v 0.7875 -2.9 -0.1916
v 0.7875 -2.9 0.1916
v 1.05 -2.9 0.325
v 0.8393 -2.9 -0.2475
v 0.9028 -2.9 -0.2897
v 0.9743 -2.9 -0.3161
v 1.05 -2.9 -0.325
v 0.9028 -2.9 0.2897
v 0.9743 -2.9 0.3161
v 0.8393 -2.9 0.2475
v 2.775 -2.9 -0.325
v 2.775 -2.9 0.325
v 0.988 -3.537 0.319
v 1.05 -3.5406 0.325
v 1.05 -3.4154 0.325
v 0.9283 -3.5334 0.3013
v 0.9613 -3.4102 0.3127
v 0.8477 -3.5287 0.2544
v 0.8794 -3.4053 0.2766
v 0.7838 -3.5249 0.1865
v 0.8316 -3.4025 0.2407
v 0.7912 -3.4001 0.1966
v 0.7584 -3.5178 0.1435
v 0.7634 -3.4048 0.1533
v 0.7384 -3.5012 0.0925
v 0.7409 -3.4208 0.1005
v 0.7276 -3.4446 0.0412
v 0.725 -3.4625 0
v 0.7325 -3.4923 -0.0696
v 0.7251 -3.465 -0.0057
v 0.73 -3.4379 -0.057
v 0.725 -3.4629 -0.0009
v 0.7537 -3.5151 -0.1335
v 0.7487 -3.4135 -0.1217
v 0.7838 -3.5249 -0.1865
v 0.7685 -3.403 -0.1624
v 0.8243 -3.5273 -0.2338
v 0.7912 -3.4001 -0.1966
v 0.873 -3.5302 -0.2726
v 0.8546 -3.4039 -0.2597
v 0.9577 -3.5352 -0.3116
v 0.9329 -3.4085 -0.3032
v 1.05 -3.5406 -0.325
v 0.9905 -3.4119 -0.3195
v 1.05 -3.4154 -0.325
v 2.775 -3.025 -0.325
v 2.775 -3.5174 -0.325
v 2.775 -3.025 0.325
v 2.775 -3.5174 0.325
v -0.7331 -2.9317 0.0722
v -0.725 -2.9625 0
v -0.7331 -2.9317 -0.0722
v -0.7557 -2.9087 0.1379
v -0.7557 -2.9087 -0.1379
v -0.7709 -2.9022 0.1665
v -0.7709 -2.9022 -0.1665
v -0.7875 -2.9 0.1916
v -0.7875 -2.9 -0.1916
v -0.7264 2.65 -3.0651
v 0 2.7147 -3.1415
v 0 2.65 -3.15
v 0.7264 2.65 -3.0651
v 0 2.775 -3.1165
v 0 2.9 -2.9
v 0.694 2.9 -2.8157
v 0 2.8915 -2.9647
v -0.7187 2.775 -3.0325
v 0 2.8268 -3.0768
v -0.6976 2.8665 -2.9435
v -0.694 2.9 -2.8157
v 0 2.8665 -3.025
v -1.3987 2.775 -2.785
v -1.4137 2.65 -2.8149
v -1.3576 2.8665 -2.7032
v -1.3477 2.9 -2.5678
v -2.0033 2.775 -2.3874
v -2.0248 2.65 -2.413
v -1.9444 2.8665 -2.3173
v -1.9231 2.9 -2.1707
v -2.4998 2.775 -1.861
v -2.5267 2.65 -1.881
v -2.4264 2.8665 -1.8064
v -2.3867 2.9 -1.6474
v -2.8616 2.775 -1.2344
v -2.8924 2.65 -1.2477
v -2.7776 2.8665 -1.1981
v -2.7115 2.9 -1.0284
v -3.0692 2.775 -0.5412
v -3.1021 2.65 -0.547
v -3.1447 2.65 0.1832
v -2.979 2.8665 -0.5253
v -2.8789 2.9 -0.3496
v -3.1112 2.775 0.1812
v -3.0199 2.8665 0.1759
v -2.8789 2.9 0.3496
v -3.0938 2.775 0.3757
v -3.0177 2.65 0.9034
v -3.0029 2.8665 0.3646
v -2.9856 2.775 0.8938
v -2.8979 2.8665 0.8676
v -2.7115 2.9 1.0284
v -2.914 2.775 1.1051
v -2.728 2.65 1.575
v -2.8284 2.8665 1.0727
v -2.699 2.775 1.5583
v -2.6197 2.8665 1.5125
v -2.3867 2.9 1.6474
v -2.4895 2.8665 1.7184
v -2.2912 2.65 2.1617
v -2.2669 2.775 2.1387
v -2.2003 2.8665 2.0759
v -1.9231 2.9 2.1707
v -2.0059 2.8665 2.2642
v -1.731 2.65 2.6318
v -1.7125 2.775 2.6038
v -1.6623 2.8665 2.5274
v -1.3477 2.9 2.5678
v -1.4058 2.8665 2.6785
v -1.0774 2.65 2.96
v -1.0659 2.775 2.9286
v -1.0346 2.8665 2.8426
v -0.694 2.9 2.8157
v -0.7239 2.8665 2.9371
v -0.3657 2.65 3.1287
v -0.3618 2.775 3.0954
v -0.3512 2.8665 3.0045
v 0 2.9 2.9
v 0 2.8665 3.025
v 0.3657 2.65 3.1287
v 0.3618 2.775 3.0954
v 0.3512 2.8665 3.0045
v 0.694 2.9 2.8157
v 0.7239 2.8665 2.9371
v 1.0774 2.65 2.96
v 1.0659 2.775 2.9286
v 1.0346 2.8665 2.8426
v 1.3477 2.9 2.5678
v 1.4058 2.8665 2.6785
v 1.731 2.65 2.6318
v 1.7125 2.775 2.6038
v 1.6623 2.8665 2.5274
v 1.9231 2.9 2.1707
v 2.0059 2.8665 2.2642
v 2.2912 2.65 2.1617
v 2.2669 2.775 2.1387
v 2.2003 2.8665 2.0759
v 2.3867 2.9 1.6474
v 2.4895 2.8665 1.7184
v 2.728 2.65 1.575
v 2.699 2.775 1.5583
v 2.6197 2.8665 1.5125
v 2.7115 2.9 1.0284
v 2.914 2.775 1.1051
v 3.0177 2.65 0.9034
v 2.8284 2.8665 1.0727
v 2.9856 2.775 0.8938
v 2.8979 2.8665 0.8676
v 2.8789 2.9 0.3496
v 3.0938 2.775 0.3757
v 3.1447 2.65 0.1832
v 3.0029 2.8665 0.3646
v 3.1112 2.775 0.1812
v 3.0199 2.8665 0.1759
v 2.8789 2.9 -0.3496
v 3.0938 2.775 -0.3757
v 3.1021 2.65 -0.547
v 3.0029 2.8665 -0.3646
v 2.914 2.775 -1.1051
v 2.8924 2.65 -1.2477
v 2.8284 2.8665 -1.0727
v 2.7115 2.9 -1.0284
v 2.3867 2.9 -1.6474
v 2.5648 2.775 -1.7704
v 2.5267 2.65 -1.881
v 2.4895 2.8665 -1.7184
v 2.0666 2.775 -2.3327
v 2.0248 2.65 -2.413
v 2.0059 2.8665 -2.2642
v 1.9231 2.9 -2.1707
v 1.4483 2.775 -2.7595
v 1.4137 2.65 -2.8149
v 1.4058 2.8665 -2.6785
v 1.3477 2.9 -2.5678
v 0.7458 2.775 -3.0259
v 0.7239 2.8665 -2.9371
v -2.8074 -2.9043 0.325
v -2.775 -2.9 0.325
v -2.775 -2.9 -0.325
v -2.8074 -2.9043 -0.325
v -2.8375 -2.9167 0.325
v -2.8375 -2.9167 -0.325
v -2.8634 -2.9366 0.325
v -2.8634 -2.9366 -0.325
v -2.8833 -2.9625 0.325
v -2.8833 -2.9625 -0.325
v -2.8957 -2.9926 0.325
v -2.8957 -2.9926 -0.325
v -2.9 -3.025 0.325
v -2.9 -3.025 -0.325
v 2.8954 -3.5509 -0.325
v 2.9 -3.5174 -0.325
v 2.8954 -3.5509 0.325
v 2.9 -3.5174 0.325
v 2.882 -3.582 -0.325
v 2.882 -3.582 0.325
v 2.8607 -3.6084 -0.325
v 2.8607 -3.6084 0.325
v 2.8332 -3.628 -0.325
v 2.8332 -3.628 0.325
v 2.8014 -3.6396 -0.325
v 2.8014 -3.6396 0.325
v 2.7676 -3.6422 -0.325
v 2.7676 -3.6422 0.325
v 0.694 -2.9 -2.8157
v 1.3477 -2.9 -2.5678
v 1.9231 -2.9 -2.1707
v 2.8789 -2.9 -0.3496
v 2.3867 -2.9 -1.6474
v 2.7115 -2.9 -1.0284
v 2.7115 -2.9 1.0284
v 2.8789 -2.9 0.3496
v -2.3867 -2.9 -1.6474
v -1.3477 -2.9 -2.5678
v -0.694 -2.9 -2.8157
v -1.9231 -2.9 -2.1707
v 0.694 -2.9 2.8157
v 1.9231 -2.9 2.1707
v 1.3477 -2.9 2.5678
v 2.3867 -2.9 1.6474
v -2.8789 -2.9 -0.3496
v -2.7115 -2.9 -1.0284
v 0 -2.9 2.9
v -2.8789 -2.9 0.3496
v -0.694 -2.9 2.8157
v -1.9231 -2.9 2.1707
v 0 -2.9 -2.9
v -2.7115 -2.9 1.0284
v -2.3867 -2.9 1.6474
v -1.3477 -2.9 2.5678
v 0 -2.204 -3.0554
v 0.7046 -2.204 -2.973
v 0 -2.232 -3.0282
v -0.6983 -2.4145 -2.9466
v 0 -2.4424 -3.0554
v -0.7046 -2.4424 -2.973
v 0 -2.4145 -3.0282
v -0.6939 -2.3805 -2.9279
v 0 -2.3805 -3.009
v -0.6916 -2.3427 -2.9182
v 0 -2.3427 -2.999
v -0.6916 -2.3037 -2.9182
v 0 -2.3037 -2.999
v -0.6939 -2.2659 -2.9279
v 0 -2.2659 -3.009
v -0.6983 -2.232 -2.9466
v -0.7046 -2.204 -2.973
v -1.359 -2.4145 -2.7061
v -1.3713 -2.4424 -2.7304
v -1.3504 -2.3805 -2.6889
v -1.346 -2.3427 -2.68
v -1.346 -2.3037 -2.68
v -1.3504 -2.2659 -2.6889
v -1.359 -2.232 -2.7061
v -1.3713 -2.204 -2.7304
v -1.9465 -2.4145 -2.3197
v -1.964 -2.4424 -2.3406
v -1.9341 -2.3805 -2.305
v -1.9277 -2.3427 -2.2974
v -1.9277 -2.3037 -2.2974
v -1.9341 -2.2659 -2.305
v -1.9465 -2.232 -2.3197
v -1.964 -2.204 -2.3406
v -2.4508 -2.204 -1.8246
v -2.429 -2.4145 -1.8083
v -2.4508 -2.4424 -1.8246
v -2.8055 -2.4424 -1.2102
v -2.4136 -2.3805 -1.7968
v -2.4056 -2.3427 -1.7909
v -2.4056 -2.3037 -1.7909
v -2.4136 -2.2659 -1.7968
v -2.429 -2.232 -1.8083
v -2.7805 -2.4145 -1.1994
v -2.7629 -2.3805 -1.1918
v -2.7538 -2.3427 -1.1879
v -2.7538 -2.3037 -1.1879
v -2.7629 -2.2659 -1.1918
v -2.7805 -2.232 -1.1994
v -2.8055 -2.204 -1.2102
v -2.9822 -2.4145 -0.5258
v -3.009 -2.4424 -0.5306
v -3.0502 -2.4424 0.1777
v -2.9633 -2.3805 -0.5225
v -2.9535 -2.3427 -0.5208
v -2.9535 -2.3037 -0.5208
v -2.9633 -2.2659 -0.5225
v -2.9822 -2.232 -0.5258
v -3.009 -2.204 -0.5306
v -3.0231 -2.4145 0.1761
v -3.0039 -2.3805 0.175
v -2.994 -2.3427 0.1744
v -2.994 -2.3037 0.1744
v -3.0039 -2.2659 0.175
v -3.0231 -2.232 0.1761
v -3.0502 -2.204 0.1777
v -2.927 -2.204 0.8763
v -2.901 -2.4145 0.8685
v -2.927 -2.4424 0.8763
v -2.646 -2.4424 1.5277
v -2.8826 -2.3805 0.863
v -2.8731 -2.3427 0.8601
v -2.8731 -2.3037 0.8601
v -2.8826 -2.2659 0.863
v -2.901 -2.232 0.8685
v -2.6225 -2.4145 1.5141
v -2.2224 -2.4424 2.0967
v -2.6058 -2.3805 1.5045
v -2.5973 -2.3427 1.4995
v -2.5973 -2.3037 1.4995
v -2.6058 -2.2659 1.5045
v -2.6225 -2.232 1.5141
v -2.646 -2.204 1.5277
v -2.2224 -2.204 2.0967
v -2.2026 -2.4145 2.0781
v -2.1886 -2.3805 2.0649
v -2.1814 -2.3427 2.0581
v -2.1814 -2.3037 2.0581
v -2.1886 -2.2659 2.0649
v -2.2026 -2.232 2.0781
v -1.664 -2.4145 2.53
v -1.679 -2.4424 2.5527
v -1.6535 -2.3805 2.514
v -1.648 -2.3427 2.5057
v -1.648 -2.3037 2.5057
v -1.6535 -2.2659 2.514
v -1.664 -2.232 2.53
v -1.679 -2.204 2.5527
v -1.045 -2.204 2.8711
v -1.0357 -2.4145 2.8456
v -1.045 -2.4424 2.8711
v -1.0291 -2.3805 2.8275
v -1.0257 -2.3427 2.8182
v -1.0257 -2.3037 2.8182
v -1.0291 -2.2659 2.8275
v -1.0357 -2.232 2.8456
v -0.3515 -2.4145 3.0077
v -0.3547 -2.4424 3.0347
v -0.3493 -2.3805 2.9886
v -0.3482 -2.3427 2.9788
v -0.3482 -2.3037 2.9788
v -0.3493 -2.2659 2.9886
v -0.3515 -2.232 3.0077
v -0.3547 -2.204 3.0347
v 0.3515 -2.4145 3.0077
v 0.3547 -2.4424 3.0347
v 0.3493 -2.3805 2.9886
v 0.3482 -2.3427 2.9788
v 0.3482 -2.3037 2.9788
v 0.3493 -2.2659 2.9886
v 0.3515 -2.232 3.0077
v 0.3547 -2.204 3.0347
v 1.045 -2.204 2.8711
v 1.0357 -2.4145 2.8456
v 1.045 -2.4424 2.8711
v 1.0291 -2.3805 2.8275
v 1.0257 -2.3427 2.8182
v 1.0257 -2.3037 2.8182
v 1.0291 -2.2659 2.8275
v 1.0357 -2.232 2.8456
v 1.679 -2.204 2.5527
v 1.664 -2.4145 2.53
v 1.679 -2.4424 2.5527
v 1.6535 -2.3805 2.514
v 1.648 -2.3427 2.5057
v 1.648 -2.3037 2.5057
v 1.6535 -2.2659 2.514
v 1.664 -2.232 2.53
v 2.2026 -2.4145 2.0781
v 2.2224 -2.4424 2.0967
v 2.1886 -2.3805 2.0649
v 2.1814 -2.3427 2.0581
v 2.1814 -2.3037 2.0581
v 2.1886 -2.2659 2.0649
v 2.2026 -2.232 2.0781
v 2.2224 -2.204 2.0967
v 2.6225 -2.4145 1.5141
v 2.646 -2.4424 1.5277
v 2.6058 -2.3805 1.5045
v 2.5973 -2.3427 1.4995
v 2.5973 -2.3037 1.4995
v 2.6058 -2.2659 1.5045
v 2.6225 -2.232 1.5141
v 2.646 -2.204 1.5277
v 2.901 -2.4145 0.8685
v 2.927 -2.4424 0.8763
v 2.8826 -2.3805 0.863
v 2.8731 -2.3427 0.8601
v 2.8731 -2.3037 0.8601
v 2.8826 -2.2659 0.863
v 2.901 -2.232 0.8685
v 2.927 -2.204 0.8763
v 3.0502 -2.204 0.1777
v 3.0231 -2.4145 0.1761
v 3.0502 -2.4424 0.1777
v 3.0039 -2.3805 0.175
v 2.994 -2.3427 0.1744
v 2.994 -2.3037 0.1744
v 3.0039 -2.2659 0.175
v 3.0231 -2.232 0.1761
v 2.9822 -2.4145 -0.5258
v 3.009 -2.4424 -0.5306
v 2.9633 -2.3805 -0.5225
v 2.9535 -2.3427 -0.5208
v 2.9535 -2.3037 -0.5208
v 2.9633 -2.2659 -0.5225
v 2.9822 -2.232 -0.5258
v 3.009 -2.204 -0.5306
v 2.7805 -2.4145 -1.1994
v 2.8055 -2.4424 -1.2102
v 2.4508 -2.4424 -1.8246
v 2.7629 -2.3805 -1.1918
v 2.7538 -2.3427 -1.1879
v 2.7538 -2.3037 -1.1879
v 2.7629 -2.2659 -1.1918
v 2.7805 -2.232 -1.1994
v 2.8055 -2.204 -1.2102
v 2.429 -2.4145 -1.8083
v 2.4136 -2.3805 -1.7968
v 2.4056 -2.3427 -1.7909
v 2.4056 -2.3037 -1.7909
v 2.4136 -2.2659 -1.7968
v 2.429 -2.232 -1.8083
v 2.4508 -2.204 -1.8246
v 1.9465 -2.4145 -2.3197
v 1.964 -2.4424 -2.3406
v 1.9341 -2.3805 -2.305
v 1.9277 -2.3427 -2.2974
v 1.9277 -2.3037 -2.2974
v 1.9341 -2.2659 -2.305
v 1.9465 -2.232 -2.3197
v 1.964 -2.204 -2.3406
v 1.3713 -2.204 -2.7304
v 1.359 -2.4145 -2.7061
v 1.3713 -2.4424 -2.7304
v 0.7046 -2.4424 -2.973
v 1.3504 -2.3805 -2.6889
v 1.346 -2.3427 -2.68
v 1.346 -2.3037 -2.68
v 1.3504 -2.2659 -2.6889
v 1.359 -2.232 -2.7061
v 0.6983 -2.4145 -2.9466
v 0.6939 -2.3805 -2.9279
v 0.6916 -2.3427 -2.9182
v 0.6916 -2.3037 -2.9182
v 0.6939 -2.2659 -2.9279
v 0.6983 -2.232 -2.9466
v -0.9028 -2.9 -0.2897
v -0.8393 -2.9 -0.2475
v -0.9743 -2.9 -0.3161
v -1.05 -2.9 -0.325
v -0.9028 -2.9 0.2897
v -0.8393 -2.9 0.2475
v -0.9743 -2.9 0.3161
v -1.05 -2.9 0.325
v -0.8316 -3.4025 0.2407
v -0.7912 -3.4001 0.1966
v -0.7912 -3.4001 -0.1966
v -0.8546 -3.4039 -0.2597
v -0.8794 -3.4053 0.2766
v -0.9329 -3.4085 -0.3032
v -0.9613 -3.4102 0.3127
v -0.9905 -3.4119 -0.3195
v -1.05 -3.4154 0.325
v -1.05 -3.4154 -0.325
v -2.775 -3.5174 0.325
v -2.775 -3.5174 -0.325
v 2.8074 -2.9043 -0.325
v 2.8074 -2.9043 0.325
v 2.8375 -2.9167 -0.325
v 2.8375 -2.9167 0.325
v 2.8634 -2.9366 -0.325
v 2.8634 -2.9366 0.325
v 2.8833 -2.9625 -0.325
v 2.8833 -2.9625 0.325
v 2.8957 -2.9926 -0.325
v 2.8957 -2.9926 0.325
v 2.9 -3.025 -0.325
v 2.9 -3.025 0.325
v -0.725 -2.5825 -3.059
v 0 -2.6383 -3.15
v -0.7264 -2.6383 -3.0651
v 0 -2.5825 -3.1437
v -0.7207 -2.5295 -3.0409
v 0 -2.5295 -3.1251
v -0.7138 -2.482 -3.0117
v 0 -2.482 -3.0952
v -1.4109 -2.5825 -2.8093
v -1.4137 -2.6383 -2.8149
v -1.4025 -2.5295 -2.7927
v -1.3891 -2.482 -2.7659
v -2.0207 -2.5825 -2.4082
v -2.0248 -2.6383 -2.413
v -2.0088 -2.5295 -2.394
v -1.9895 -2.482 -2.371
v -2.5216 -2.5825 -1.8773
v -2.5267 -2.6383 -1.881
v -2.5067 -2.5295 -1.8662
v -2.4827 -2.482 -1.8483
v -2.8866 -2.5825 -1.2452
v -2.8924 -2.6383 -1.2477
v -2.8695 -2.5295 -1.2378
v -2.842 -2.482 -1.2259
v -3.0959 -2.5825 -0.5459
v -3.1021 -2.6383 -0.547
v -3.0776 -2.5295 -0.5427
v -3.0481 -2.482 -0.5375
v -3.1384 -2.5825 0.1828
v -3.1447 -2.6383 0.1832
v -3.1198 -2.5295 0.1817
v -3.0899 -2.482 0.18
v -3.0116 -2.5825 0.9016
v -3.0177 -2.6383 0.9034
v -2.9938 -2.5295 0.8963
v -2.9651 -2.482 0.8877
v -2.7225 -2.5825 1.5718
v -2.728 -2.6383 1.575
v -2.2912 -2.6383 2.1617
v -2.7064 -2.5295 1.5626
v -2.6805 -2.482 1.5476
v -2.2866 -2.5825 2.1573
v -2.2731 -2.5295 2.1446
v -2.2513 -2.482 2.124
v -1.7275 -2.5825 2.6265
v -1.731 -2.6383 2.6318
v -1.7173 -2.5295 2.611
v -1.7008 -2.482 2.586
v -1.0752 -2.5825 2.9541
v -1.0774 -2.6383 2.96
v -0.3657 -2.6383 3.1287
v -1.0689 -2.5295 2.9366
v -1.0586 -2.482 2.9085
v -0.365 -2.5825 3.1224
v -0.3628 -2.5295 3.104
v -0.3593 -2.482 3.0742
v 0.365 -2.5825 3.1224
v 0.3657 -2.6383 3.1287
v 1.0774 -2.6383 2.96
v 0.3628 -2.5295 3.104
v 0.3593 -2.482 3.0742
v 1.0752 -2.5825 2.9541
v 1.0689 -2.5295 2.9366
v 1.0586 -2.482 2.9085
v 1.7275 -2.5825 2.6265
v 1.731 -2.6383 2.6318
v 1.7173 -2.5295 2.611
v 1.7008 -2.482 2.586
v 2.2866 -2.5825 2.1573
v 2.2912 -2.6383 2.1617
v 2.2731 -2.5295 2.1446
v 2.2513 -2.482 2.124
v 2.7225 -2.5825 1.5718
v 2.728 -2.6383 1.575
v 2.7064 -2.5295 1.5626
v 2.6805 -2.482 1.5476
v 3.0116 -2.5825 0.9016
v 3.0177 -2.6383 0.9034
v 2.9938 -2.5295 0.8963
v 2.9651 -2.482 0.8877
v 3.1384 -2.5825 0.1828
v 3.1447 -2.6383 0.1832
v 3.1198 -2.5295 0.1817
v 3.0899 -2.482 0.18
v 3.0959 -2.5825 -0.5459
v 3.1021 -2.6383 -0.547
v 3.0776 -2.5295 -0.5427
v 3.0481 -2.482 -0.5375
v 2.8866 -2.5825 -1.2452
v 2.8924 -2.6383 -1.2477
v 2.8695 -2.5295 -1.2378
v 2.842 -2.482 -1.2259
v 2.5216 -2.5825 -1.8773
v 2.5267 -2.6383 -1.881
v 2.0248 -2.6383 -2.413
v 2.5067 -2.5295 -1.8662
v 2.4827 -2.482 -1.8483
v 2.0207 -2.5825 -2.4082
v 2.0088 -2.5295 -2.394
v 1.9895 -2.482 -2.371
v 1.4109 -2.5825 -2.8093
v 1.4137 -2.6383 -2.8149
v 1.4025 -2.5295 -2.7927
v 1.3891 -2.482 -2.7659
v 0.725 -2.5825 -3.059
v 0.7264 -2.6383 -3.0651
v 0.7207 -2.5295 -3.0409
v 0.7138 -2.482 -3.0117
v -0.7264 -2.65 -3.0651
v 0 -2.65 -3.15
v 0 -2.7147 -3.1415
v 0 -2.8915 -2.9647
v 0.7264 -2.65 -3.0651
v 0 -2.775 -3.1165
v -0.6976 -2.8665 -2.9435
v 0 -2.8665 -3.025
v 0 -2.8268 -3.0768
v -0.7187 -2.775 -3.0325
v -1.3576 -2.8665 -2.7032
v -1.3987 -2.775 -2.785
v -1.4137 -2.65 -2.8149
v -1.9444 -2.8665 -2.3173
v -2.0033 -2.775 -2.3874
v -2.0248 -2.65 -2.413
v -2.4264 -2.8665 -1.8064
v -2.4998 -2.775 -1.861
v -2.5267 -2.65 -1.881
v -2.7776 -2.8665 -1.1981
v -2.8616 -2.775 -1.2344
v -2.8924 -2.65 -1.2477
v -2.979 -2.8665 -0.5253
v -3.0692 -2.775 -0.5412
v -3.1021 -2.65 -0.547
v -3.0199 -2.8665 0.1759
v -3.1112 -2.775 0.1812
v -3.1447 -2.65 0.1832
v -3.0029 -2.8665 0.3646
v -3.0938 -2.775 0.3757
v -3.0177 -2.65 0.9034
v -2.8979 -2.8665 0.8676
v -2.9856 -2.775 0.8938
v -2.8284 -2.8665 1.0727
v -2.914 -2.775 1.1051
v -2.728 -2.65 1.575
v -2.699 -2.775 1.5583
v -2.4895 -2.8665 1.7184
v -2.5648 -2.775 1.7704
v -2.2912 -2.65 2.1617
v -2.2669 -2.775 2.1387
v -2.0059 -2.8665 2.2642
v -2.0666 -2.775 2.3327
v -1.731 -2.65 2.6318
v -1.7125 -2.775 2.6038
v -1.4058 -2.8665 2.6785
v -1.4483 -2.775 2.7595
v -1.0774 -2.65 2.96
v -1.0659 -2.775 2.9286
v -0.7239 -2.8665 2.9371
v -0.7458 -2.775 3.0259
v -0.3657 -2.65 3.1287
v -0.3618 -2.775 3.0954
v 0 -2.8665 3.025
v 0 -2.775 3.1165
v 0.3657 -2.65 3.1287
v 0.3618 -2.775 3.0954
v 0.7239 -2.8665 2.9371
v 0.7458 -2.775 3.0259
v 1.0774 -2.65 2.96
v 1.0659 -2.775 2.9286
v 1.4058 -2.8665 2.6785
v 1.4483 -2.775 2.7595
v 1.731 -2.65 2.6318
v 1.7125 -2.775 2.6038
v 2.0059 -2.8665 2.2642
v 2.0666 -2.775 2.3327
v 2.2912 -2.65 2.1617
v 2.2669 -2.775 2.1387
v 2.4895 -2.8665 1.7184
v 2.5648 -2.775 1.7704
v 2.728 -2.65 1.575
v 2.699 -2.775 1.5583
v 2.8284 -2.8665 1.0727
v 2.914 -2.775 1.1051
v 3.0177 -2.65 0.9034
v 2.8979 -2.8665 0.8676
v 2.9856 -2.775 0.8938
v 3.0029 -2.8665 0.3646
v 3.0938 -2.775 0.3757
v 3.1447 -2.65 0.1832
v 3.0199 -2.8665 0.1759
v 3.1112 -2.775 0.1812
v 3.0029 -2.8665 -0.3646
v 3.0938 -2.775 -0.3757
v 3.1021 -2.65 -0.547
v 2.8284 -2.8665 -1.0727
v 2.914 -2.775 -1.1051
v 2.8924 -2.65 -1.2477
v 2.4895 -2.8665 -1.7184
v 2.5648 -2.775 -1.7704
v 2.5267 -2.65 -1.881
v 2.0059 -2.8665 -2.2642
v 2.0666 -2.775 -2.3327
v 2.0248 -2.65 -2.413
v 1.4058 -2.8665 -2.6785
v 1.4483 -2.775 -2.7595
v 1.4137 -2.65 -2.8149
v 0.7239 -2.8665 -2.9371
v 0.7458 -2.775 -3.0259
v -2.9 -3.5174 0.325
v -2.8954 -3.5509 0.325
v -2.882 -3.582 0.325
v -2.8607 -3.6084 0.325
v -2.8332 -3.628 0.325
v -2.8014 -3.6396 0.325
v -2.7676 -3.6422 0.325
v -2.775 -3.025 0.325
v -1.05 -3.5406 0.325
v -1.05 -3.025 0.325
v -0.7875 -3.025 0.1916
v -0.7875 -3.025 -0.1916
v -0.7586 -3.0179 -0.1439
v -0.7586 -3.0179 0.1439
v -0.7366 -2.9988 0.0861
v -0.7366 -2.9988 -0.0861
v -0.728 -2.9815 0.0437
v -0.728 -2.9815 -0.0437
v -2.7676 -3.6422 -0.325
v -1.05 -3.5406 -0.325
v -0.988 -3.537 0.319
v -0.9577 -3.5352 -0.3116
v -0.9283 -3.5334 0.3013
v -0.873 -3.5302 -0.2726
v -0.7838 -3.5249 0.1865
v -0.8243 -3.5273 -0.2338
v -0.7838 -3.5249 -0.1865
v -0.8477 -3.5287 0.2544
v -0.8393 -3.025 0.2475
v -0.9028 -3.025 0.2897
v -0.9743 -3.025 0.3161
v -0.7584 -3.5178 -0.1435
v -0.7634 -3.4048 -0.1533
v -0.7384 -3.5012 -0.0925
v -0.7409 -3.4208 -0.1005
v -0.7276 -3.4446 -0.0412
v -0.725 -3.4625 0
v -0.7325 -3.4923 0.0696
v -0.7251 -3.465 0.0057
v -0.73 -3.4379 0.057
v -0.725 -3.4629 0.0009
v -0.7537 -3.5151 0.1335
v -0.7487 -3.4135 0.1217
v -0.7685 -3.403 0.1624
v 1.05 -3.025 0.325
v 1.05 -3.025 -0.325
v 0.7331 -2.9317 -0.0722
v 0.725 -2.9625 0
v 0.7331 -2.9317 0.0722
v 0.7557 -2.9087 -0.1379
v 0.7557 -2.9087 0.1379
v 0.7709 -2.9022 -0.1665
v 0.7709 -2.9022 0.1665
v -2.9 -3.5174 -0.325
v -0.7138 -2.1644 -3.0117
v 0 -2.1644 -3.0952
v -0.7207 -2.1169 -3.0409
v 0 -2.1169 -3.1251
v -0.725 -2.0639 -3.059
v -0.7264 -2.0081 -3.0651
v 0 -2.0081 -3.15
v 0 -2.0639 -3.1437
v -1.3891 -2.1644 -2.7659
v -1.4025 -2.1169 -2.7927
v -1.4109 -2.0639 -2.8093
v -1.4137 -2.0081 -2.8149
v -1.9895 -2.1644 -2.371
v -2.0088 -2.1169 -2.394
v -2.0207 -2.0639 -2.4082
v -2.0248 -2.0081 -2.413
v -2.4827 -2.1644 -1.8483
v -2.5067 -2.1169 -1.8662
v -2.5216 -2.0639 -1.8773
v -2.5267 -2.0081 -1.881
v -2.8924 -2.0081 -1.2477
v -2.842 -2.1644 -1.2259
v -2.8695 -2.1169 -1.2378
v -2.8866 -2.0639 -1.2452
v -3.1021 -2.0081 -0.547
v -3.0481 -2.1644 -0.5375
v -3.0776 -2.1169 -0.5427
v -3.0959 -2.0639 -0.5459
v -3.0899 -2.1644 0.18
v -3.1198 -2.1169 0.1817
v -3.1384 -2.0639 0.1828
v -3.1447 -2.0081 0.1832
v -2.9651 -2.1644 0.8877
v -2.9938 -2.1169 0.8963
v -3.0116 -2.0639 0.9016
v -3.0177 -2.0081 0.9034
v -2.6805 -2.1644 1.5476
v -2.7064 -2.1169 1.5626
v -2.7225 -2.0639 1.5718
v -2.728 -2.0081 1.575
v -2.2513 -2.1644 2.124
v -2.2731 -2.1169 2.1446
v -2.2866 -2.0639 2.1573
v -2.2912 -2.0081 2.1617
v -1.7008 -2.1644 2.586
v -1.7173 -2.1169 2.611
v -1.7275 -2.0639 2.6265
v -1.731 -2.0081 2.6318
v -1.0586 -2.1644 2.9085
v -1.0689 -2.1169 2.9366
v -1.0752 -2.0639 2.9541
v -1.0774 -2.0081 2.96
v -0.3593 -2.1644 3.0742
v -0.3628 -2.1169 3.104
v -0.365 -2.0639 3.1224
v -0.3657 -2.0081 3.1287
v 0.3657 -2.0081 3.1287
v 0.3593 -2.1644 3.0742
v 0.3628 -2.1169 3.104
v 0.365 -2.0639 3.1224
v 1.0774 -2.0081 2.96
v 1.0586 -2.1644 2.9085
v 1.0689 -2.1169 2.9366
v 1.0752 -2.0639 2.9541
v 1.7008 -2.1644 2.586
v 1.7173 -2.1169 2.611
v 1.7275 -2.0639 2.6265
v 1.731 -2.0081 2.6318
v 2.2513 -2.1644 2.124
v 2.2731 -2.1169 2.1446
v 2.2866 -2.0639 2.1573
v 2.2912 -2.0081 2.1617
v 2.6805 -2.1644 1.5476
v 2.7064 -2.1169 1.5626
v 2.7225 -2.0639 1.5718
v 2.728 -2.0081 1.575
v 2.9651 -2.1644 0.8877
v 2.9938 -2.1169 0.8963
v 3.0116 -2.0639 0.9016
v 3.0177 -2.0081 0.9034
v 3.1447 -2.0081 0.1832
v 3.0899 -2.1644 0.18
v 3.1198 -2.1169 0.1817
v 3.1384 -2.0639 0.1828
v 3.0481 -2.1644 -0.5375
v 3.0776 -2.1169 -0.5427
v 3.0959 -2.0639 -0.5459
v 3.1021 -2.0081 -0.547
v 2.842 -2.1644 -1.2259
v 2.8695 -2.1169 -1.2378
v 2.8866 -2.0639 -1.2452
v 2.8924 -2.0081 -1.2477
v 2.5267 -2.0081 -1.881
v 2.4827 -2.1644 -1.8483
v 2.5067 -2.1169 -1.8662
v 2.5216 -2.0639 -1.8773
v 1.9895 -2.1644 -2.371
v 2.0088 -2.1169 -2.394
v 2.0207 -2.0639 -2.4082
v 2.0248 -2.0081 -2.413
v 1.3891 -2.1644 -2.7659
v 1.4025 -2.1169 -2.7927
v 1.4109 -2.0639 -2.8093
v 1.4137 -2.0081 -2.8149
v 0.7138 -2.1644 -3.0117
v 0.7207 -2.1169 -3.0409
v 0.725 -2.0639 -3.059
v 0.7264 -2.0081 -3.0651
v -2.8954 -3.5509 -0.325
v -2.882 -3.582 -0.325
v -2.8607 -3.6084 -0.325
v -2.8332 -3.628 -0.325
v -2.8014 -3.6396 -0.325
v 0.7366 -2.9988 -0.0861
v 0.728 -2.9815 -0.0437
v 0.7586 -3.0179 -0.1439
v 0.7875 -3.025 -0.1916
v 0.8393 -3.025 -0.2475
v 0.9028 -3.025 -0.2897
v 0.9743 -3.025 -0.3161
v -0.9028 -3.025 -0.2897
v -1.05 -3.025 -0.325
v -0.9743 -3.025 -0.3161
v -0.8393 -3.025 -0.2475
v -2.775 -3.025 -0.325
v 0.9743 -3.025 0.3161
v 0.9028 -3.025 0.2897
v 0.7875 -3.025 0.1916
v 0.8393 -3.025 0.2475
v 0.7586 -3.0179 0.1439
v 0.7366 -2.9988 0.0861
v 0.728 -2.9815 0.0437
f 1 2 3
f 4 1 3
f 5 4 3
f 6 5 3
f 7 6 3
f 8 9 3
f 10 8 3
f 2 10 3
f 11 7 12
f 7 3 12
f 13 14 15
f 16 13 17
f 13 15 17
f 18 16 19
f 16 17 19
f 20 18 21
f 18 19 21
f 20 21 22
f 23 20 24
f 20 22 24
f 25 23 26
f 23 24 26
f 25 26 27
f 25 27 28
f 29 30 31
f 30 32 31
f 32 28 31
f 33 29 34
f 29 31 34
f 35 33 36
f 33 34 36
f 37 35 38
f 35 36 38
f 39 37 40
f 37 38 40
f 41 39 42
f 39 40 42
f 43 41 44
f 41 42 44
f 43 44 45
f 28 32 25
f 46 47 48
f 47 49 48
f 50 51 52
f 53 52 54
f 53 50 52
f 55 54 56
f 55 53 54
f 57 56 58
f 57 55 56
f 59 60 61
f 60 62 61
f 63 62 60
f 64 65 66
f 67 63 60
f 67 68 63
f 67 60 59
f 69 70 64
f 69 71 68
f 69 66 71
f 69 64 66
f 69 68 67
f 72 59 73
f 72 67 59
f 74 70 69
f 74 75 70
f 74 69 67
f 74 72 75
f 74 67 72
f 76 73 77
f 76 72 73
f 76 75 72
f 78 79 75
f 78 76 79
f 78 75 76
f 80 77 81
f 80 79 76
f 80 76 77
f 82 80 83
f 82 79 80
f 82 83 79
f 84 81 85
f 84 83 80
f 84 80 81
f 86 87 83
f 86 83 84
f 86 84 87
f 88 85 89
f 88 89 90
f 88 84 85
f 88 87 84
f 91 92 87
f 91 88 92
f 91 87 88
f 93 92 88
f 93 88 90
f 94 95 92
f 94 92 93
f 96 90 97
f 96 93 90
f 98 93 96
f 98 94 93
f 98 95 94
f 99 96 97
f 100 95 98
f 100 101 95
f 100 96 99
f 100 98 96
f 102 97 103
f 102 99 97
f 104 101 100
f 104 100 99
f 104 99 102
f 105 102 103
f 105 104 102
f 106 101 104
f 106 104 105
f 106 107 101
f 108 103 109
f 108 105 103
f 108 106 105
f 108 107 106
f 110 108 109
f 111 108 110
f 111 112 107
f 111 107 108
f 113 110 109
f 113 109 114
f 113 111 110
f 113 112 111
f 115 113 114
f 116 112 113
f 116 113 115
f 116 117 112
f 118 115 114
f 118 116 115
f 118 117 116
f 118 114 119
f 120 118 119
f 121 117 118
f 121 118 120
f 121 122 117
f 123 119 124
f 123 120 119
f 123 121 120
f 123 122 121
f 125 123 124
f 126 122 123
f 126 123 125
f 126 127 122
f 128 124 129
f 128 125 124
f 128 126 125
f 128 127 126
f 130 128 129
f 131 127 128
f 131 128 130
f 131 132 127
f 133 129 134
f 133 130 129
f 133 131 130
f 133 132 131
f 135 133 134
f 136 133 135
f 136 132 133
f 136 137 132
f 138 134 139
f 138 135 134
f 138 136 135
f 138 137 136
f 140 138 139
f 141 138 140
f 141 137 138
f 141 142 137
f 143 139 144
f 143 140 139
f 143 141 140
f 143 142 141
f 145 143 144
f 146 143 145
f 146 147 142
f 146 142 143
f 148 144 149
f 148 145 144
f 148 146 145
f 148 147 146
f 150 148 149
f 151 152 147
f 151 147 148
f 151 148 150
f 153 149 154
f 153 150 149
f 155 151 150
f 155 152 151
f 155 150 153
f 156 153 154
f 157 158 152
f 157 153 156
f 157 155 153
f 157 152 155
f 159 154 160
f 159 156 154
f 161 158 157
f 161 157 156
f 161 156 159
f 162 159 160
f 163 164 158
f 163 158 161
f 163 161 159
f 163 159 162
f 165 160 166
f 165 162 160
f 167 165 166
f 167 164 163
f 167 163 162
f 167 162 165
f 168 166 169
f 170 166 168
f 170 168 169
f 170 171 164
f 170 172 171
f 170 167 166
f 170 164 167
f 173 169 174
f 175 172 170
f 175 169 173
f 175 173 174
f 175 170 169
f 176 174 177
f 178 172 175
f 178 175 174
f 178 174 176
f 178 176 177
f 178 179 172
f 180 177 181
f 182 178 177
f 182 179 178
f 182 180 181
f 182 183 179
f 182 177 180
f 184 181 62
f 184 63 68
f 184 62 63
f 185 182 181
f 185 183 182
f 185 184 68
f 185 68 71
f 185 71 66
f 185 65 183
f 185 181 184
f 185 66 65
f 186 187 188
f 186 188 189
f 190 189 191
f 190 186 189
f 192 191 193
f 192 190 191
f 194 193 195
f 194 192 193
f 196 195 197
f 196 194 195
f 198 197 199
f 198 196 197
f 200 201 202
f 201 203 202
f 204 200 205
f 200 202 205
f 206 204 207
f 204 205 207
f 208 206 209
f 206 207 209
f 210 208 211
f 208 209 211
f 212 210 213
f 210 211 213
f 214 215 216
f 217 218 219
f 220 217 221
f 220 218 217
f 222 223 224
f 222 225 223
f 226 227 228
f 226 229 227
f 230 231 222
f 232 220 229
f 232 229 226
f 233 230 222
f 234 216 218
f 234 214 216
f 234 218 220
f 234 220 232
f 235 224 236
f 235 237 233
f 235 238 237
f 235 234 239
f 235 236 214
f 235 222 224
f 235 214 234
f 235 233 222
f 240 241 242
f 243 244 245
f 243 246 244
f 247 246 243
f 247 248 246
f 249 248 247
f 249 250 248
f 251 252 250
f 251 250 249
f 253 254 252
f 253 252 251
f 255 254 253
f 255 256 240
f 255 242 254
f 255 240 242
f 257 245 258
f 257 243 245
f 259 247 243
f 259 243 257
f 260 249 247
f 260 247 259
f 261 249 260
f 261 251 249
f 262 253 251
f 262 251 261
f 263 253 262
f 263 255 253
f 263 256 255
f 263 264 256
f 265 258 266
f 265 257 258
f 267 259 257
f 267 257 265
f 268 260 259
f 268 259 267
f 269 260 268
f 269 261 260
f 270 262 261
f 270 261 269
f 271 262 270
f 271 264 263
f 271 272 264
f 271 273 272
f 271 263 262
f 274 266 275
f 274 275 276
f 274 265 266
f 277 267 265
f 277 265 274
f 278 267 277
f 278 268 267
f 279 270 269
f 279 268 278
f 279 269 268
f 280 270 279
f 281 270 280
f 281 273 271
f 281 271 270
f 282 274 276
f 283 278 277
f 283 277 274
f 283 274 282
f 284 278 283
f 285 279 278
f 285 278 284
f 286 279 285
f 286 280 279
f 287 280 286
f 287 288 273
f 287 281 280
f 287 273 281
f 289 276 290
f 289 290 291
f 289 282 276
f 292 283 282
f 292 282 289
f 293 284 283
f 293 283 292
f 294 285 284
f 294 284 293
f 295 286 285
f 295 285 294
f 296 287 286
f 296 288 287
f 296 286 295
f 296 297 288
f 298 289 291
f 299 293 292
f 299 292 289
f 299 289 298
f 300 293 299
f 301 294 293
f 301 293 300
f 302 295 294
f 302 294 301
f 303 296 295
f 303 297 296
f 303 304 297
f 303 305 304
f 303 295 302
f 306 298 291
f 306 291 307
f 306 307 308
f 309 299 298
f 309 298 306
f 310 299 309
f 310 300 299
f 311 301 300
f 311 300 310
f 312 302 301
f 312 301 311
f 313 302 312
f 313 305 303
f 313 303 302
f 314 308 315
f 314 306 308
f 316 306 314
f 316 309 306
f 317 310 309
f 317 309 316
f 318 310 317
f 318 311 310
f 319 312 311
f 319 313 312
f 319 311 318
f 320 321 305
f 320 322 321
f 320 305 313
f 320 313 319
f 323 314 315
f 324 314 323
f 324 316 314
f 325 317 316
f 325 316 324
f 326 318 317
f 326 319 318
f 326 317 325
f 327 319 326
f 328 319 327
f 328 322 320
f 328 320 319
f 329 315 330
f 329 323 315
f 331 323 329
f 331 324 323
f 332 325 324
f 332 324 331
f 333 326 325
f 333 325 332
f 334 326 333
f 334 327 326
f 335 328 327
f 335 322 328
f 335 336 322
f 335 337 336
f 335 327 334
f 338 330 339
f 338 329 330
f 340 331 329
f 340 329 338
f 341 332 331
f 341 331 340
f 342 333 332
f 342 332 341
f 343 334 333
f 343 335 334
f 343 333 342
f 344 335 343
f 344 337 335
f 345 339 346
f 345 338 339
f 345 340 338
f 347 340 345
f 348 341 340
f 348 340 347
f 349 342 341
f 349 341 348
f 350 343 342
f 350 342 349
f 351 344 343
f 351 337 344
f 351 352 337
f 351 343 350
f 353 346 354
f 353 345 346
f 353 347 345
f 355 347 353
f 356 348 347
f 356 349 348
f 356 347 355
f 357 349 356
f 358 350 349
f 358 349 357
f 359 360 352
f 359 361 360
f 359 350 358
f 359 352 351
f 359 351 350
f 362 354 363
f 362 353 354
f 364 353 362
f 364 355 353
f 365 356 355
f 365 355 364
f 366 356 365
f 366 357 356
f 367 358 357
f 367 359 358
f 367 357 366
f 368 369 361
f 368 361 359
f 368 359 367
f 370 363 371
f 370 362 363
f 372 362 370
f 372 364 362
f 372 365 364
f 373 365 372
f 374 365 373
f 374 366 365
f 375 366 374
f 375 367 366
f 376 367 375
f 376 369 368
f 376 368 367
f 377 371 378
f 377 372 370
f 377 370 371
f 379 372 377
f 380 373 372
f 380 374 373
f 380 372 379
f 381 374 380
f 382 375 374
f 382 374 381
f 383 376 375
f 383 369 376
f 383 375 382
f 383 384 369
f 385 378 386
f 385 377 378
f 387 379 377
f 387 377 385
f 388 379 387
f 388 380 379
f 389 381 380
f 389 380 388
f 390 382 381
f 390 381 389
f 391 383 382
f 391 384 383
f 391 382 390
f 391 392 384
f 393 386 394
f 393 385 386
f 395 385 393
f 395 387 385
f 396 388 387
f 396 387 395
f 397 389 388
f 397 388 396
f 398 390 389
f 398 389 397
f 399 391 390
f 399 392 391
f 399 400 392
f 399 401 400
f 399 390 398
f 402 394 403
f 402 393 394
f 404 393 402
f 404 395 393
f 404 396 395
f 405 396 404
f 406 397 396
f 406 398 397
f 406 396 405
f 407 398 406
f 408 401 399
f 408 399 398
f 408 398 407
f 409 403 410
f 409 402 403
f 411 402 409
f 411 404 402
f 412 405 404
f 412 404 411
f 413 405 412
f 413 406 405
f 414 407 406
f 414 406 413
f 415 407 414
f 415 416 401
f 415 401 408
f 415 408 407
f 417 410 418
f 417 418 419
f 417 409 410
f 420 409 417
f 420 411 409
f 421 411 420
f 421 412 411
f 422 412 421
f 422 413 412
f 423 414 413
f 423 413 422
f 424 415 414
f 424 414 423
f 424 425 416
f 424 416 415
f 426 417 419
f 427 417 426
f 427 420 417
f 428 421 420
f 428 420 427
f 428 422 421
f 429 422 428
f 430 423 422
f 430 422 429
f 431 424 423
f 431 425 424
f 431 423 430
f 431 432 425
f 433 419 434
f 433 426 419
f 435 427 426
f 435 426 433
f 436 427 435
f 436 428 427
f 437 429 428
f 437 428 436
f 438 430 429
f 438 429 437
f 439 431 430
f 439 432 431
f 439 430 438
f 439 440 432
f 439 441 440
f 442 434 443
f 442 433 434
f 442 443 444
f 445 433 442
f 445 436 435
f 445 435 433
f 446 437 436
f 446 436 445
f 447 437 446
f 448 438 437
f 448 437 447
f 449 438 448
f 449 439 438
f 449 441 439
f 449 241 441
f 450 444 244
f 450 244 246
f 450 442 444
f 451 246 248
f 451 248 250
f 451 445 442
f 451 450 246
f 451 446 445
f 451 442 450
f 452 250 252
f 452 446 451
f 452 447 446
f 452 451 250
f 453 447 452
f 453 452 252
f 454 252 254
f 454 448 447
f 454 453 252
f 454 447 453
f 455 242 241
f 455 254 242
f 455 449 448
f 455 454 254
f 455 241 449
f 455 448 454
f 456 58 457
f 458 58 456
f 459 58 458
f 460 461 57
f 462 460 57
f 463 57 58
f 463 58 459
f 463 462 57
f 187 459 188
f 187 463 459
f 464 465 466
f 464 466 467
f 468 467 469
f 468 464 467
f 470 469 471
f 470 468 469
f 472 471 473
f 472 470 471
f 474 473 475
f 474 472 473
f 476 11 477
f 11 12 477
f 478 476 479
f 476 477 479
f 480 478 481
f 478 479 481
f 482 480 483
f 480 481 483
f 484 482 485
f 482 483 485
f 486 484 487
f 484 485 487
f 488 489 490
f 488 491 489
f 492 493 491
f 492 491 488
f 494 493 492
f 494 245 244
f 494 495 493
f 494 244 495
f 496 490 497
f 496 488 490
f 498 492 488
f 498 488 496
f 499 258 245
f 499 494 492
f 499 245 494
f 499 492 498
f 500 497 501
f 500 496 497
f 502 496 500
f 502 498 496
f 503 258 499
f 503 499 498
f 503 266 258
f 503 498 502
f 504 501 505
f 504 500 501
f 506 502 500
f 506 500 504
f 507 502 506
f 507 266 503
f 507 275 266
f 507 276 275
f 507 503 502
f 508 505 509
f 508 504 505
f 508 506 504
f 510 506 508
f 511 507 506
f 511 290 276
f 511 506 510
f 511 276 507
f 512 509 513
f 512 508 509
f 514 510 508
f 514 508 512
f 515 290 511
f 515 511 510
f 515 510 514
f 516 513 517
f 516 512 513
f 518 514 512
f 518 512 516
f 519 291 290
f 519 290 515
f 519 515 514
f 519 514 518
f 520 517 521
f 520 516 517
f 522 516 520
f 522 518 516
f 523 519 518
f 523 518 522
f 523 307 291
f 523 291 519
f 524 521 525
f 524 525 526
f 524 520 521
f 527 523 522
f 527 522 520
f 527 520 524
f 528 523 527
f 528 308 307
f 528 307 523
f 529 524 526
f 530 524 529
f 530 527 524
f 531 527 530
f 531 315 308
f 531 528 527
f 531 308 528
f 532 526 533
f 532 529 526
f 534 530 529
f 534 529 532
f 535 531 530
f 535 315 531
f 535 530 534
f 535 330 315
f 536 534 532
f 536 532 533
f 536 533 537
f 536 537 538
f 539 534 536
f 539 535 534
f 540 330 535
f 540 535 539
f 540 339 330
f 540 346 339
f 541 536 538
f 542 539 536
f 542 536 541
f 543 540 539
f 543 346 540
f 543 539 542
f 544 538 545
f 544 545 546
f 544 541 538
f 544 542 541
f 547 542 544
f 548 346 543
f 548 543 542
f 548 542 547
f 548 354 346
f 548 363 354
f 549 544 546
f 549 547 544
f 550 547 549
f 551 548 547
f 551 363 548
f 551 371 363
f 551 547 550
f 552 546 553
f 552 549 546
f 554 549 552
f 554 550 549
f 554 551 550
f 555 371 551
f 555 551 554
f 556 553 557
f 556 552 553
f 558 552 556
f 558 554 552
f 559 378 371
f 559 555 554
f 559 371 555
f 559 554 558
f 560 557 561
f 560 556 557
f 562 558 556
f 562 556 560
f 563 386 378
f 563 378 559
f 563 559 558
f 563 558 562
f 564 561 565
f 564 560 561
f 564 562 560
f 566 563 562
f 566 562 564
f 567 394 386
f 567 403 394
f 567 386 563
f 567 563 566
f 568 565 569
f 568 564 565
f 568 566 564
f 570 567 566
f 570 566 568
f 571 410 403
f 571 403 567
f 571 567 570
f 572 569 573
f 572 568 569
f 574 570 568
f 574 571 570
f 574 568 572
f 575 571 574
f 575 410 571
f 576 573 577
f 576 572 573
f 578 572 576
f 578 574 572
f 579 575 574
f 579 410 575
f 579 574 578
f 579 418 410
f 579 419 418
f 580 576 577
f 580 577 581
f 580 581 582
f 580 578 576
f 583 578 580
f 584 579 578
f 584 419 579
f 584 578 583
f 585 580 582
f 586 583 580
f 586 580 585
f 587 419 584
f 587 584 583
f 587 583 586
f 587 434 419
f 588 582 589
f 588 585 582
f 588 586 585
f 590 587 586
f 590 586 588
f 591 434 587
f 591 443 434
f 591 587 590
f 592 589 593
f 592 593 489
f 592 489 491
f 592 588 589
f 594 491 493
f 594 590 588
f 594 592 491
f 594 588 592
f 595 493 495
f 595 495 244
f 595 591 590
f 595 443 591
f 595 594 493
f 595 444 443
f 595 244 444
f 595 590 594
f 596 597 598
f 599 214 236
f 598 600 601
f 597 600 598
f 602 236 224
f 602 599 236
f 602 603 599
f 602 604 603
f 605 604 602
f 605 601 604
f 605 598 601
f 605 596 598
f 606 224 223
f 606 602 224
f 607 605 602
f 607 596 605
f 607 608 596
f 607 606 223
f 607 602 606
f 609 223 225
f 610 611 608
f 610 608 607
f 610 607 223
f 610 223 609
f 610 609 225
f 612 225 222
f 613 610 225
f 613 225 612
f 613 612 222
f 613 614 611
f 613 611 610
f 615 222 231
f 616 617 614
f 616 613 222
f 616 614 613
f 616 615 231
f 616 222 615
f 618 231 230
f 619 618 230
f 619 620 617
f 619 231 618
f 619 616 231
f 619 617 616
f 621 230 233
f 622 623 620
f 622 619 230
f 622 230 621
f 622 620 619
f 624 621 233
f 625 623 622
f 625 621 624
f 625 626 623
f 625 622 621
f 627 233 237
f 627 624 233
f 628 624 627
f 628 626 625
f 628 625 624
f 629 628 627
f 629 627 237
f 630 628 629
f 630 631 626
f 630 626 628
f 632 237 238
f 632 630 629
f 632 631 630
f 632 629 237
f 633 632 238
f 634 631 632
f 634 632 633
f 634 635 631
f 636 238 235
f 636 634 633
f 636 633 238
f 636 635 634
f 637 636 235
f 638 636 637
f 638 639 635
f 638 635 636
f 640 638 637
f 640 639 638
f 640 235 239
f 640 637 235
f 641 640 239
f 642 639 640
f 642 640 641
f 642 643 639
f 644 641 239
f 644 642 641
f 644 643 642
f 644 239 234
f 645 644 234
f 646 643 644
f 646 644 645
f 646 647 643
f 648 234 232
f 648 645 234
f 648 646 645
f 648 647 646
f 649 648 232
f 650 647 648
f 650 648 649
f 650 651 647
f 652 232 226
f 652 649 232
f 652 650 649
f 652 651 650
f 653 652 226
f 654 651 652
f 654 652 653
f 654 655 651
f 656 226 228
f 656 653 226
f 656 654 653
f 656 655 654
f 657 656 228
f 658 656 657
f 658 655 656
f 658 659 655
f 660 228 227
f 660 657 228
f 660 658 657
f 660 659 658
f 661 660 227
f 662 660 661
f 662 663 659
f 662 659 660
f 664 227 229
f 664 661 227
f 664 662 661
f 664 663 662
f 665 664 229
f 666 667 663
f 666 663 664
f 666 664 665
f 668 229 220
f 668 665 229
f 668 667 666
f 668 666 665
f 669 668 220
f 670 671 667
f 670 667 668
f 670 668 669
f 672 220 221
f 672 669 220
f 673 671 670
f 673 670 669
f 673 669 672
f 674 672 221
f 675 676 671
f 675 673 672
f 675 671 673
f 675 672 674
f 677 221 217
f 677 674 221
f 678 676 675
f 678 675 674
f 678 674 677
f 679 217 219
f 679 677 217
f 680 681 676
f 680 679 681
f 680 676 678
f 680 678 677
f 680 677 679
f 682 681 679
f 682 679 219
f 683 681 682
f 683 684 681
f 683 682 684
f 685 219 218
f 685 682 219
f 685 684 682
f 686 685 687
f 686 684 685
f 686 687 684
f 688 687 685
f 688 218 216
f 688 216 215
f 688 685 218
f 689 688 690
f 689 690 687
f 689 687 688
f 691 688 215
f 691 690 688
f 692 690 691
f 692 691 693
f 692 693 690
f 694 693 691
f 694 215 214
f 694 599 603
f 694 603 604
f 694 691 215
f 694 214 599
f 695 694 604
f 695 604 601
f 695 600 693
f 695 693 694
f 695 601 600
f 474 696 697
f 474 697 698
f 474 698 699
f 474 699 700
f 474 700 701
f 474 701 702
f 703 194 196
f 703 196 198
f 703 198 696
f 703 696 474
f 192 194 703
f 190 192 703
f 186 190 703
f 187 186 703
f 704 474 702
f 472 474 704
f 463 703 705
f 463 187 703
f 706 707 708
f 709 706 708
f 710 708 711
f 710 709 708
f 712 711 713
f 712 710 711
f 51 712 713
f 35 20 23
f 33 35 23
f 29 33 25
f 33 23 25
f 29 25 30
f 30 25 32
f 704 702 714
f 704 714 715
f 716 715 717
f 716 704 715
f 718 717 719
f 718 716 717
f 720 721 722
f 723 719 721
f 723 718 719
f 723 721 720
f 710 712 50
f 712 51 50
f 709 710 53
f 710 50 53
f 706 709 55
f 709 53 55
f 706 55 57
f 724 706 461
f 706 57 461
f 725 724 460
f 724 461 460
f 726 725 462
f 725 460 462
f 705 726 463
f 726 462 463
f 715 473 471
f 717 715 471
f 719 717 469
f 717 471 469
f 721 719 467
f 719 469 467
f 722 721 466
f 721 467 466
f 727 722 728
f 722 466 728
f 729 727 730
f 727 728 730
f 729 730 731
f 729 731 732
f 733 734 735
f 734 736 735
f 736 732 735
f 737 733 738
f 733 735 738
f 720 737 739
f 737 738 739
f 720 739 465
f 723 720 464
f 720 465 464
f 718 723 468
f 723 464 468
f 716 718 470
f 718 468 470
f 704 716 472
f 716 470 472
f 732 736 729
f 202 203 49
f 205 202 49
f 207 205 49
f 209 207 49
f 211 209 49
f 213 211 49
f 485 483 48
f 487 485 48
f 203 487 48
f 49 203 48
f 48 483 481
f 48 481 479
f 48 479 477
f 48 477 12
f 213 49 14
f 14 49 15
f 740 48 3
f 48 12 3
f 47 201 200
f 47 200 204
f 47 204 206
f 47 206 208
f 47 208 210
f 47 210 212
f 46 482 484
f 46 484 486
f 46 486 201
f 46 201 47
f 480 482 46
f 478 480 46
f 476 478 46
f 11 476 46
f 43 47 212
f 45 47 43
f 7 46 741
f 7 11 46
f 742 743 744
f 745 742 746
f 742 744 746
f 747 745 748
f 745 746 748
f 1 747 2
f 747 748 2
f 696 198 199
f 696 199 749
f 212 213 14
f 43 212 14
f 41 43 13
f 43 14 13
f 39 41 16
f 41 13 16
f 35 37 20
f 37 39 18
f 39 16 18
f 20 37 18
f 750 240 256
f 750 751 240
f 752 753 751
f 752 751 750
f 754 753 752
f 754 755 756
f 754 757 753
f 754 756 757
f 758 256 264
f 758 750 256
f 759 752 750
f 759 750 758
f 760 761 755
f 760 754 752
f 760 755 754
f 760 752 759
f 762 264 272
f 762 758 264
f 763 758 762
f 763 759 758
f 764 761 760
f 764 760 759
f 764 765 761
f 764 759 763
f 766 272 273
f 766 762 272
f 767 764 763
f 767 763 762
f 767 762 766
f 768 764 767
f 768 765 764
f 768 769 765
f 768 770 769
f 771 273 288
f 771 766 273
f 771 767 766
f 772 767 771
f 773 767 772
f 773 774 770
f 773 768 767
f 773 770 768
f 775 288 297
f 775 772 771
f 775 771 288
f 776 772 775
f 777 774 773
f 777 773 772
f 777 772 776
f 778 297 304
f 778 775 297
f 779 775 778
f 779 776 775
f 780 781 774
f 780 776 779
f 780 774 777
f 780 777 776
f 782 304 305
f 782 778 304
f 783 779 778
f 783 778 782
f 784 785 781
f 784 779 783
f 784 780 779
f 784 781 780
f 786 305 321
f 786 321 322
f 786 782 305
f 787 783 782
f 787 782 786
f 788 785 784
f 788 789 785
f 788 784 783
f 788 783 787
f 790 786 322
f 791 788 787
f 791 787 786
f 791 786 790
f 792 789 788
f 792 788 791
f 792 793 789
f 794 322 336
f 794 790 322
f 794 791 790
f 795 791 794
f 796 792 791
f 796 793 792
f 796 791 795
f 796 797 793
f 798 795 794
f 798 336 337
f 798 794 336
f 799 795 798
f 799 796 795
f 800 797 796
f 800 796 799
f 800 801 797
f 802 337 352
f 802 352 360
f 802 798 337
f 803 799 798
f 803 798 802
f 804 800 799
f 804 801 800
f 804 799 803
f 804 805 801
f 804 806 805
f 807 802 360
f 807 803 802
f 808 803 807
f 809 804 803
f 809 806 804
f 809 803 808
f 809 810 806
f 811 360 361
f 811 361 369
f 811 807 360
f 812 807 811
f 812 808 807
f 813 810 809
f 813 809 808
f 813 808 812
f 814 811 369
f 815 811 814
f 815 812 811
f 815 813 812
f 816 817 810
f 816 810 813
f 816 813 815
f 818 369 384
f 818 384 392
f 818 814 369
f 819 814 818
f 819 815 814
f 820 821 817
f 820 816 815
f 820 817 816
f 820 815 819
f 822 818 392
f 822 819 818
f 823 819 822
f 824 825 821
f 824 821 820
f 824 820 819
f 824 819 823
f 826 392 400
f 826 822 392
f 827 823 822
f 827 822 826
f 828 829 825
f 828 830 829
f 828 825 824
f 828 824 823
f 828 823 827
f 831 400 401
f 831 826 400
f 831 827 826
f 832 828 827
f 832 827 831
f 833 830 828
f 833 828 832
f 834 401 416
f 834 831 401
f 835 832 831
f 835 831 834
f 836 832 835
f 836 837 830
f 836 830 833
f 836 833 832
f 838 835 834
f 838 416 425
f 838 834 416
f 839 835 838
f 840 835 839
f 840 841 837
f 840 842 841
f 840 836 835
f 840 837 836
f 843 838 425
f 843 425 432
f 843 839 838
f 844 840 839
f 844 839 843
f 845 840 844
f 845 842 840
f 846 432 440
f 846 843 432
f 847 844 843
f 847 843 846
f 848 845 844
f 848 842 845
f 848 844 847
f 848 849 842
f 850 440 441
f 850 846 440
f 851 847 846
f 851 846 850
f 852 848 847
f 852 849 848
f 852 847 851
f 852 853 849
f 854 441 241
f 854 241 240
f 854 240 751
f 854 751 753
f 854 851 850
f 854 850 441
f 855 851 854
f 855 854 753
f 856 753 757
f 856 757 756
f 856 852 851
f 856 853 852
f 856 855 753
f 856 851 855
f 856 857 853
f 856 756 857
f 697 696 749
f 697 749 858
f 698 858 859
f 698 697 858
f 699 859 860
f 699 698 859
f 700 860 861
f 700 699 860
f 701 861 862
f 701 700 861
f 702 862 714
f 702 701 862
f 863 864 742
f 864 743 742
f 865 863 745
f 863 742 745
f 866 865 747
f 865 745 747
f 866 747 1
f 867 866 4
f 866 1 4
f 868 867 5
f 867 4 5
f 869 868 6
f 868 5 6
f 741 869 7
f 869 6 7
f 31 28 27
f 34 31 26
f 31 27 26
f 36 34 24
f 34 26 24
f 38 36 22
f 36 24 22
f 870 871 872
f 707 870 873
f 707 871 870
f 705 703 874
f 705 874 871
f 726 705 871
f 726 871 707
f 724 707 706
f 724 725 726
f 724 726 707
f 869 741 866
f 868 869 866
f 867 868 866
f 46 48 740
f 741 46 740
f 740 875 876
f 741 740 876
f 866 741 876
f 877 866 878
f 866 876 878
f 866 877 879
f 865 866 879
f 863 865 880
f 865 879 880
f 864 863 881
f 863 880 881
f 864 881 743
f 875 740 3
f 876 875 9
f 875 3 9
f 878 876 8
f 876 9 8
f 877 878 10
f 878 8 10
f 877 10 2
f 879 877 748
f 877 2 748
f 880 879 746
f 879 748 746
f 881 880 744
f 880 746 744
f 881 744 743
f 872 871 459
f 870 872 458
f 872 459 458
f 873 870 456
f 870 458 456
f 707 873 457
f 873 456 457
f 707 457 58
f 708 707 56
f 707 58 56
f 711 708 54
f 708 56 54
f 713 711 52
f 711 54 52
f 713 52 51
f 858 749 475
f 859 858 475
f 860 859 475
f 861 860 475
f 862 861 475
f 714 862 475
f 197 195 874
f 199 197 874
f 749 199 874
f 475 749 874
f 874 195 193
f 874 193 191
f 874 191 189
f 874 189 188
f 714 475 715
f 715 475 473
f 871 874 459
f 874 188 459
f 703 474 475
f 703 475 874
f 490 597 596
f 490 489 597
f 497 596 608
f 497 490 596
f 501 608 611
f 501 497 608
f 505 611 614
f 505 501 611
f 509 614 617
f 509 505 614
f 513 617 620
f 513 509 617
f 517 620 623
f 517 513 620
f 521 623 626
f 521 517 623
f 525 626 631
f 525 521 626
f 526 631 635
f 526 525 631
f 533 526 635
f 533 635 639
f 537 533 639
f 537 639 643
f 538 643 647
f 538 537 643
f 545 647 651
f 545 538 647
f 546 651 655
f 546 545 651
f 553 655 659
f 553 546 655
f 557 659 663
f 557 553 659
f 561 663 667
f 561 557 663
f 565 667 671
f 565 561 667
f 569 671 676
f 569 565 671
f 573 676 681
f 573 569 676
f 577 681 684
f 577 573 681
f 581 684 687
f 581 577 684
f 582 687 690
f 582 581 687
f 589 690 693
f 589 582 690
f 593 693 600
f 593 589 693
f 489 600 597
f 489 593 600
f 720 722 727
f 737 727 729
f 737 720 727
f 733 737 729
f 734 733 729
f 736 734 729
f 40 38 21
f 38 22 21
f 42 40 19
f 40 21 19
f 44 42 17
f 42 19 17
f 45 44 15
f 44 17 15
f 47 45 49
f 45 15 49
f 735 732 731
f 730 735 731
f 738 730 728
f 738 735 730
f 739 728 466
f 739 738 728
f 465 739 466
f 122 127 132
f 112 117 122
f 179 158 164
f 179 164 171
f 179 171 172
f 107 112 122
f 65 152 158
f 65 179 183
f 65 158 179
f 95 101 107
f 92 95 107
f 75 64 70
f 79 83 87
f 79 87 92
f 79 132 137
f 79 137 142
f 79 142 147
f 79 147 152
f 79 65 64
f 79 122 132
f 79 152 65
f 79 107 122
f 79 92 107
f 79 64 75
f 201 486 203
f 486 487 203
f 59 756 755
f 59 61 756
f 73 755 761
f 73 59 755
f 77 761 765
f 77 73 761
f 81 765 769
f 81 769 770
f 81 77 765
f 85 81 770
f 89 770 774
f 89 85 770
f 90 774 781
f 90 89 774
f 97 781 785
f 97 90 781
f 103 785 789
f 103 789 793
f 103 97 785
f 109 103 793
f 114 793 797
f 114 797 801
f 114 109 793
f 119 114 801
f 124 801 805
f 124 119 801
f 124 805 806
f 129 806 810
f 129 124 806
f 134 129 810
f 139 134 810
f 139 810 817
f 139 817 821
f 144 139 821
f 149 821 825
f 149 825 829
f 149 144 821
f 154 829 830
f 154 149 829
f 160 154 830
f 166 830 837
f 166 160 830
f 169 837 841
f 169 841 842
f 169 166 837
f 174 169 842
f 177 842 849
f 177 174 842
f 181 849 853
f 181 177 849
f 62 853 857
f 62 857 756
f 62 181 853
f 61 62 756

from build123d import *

# Parameters (mm, degrees)
TAB_DEPTH          = 0.325
TAB_2_DEPTH        = 0.325
CUT_EXTRUDE1_DEPTH = 8.313344055


with BuildPart() as part:
    # Sketch1 → Cap Body (revolve)
    with BuildSketch(Plane(origin=(0, 0, 0), x_dir=(0, 0, -1), z_dir=(1, 0, 0))):
        with BuildLine():
            Line((0, 2.9), (0, -2.9))
            Line((0, -2.9), (2.9, -2.9))
            ThreePointArc((2.9, -2.9), (3.076776695, -2.826776695), (3.15, -2.65))
            Line((3.15, -2.65), (3.15, -2.638280347))
            ThreePointArc((3.15, -2.638280347), (3.125108719, -2.529532636), (3.055391484, -2.442439884))
            ThreePointArc((3.055391484, -2.442439884), (2.997790055, -2.32320442), (3.055391484, -2.203968956))
            ThreePointArc((3.055391484, -2.203968956), (3.125108719, -2.116876204), (3.15, -2.008128493))
            Line((3.15, -2.008128493), (3.15, 2.65))
            ThreePointArc((3.15, 2.65), (3.076776695, 2.826776695), (2.9, 2.9))
            Line((2.9, 2.9), (0, 2.9))
        make_face()
    revolve(axis=Axis((0, -4.584100675, 0), (0, 1, 0)))


with BuildPart() as body_2:
    # Tab Sketch → Tab (new, symmetric)
    with BuildSketch(Plane.XY):
        with BuildLine():
            Line((-0.7875, -2.9), (-2.775, -2.9))
            ThreePointArc((-2.775, -2.9), (-2.863388348, -2.936611652), (-2.9, -3.025))
            Line((-2.9, -3.025), (-2.9, -3.51739175))
            ThreePointArc((-2.9, -3.51739175), (-2.860740484, -3.608350914), (-2.767622888, -3.642173873))
            Line((-2.767622888, -3.642173873), (-0.783811444, -3.524891062))
            ThreePointArc((-0.783811444, -3.524891062), (-0.725108938, -3.458811444), (-0.791188556, -3.400108938))
            Line((-0.791188556, -3.400108938), (-2.775, -3.51739175))
            Line((-2.775, -3.51739175), (-2.775, -3.025))
            Line((-2.775, -3.025), (-0.7875, -3.025))
            ThreePointArc((-0.7875, -3.025), (-0.725, -2.9625), (-0.7875, -2.9))
        make_face()
    extrude(amount=TAB_DEPTH, both=True)


with BuildPart() as body_3:
    # Tab Sketch → Tab 2 (new, symmetric)
    with BuildSketch(Plane.XY):
        with BuildLine():
            Line((0.7875, -2.9), (2.775, -2.9))
            ThreePointArc((2.775, -2.9), (2.863388348, -2.936611652), (2.9, -3.025))
            Line((2.9, -3.025), (2.9, -3.51739175))
            ThreePointArc((2.9, -3.51739175), (2.860740484, -3.608350914), (2.767622888, -3.642173873))
            Line((2.767622888, -3.642173873), (0.783811444, -3.524891062))
            ThreePointArc((0.783811444, -3.524891062), (0.725108938, -3.458811444), (0.791188556, -3.400108938))
            Line((0.791188556, -3.400108938), (2.775, -3.51739175))
            Line((2.775, -3.51739175), (2.775, -3.025))
            Line((2.775, -3.025), (0.7875, -3.025))
            ThreePointArc((0.7875, -3.025), (0.725, -2.9625), (0.7875, -2.9))
        make_face()
    extrude(amount=TAB_2_DEPTH, both=True)


with BuildPart() as cut_extrude1_tool:
    # Sketch4 → Cut-Extrude1 (new, through all)
    with BuildSketch(Plane.XZ.offset(2.9)):
        with BuildLine():
            Line((-1.05, 0.325), (-0.725, 0.325))
            Line((-0.725, 0.325), (0.725, 0.325))
            Line((0.725, 0.325), (1.05, 0.325))
            ThreePointArc((1.05, 0.325), (0.725, 0), (1.05, -0.325))
            Line((1.05, -0.325), (0.725, -0.325))
            Line((0.725, -0.325), (-0.725, -0.325))
            Line((-0.725, -0.325), (-1.05, -0.325))
            ThreePointArc((-1.05, -0.325), (-0.725, 0), (-1.05, 0.325))
        make_face()
    extrude(amount=CUT_EXTRUDE1_DEPTH)


with BuildPart() as body_2_1:
    add(body_2.part)

    # Cut-Extrude1: cut by cut_extrude1_tool
    add(cut_extrude1_tool.part, mode=Mode.SUBTRACT)


with BuildPart() as body_3_1:
    add(body_3.part)

    # Cut-Extrude1: cut by cut_extrude1_tool
    add(cut_extrude1_tool.part, mode=Mode.SUBTRACT)


solid = Compound([part.part, body_2_1.part, body_3_1.part])
